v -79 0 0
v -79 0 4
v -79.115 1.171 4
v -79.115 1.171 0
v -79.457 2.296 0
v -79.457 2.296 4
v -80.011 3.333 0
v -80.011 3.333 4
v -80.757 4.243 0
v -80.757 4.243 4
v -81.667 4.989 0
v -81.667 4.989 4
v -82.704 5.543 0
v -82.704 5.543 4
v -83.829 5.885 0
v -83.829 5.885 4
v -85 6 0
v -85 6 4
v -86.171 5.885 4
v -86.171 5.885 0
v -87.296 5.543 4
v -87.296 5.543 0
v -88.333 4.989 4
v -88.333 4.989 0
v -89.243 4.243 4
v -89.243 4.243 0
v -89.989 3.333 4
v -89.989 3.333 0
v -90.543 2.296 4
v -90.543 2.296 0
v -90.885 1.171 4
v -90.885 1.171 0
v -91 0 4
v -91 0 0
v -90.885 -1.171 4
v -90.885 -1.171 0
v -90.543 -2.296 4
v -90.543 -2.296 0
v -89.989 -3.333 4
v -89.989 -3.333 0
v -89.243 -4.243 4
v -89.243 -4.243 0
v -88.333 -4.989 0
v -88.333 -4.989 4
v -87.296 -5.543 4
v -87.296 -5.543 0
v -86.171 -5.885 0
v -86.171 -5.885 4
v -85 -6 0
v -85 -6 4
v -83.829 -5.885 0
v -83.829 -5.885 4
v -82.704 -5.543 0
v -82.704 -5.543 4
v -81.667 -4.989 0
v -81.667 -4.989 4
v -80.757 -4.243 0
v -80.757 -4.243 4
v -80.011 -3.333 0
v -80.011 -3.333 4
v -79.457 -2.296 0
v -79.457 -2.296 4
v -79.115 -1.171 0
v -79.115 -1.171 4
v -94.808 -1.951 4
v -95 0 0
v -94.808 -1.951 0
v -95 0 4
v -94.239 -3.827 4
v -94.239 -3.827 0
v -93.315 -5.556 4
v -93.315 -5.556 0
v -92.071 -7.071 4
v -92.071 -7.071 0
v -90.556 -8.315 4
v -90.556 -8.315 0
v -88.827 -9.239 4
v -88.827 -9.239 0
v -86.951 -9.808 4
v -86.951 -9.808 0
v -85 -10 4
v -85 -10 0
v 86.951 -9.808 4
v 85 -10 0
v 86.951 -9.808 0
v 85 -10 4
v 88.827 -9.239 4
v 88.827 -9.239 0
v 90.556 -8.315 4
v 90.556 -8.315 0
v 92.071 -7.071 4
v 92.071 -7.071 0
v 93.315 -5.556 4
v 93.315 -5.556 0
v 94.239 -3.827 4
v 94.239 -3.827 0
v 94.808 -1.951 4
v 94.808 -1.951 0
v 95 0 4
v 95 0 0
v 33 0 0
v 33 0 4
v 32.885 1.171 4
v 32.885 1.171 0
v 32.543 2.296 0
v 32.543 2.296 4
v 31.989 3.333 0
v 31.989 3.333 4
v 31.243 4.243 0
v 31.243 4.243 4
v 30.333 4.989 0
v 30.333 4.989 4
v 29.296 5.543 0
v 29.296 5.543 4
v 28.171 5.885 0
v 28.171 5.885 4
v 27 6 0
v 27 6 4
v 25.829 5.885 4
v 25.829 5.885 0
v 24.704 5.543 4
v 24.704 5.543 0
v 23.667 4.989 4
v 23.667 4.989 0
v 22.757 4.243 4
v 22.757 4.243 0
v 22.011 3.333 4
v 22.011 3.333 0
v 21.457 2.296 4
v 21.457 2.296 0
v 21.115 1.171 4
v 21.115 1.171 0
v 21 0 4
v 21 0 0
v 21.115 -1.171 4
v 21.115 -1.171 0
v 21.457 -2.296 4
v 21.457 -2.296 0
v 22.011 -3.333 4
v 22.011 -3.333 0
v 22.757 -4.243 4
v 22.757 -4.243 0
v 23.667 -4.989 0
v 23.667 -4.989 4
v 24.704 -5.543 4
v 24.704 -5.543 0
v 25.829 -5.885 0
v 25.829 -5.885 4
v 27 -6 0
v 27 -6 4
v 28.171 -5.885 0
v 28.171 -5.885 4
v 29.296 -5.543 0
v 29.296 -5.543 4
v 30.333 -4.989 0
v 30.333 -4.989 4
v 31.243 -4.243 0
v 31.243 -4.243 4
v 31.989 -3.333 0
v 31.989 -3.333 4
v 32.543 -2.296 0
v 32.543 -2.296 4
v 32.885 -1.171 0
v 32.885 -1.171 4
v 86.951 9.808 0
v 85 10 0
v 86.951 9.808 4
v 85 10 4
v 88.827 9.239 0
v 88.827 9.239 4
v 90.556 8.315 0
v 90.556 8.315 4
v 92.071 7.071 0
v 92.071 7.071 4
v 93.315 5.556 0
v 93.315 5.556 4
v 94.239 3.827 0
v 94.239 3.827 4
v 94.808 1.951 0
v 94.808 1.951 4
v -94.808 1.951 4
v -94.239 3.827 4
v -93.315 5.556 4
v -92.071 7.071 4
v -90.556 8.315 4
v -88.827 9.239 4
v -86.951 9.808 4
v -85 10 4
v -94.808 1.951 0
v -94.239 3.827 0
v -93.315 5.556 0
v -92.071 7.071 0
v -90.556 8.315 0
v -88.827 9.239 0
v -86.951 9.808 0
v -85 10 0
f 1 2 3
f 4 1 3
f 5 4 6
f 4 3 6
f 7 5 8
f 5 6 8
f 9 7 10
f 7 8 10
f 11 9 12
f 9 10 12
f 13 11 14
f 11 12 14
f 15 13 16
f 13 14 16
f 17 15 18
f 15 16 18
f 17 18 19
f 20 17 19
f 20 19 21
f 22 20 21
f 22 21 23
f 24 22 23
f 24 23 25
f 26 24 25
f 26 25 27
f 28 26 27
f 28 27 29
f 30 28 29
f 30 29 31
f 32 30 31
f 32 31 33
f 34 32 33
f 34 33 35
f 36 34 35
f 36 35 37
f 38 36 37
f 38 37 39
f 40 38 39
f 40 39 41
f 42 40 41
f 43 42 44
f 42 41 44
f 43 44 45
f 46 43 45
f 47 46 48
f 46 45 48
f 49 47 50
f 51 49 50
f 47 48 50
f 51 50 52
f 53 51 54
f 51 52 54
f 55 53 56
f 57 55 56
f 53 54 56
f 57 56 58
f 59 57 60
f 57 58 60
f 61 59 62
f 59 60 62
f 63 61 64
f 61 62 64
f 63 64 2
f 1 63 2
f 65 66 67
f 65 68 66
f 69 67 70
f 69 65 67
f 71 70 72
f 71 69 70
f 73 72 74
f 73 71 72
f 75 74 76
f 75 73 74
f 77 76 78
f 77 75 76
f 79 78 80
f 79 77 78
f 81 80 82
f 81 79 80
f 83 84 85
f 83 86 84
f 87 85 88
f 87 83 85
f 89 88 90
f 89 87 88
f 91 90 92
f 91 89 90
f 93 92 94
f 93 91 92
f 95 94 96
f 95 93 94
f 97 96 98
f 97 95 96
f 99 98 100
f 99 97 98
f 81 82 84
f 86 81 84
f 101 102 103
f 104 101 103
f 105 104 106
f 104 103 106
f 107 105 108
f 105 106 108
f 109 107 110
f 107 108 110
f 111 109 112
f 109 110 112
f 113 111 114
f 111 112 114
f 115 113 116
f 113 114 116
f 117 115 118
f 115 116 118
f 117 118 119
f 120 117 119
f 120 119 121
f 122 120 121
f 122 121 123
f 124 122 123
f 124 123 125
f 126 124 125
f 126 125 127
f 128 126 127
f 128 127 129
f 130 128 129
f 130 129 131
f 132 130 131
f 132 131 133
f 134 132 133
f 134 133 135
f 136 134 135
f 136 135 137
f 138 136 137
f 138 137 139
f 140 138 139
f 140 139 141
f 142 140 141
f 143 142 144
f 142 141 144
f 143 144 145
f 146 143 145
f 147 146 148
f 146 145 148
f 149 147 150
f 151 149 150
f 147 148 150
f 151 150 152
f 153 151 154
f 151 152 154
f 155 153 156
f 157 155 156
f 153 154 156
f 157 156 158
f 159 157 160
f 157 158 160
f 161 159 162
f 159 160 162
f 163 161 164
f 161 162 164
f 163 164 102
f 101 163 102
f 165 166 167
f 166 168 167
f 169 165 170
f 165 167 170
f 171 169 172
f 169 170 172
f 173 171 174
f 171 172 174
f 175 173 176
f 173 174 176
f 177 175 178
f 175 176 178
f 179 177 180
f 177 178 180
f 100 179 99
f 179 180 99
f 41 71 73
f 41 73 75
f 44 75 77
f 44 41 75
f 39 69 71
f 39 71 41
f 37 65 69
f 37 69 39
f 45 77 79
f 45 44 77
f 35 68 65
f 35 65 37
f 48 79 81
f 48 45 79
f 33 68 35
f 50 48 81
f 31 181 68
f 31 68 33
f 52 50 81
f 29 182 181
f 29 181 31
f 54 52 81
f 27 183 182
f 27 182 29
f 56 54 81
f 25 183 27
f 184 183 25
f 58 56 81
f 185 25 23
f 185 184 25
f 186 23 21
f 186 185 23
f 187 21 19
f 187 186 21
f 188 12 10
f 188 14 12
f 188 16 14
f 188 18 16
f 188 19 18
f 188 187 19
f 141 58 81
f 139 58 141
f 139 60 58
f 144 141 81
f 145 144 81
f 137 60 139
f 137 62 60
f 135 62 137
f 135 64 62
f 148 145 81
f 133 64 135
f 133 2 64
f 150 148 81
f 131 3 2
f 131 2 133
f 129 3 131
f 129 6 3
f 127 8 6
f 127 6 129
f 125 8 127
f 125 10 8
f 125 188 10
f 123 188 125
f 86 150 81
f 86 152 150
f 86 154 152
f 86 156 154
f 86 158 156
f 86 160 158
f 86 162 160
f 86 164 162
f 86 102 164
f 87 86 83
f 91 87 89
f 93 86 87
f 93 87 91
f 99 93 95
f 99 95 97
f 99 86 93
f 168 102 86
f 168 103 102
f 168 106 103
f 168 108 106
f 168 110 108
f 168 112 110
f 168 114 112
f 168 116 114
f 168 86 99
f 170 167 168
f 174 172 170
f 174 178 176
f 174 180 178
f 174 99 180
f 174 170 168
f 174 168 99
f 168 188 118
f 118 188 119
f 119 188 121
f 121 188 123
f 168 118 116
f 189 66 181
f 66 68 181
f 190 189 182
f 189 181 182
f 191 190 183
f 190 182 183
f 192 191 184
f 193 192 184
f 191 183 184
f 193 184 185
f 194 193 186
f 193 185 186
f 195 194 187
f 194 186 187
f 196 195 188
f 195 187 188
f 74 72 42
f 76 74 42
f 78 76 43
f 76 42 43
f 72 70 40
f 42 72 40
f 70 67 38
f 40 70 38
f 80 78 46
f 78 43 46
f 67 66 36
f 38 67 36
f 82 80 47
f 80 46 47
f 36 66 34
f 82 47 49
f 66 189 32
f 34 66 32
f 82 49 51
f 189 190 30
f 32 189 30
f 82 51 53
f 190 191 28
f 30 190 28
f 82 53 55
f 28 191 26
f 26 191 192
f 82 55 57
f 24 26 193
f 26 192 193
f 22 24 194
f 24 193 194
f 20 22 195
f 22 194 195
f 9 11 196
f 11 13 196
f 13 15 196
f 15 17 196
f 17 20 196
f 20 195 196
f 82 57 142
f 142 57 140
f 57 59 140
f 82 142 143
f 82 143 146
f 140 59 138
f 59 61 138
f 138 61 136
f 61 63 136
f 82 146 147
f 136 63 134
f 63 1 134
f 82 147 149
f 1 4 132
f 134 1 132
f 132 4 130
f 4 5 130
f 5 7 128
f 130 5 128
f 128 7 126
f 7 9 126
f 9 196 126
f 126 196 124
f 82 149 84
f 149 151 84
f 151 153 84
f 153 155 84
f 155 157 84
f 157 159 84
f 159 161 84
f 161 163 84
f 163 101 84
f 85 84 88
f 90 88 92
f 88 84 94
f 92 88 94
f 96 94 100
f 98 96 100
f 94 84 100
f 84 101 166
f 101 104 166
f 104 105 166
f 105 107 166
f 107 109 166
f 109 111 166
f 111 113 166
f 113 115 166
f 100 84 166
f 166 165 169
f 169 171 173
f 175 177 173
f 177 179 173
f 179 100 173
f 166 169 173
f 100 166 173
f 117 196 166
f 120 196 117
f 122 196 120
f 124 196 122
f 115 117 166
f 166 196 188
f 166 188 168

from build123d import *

# Parameters (mm, degrees)
F0_W     = 190
F0_H     = 20
F1_DEPTH = 4
F2_R     = 6
F3_DEPTH = 4.001
F4_R     = 9.99999


# Not quite as in the source:
# - a fillet or chamfer is up to 0.001 mm smaller than in the source, because OpenCascade refuses the exact size


with BuildPart() as f1:
    # F0 (on Top) → F1 (new body)
    with BuildSketch(Plane.XY):
        Rectangle(F0_W, F0_H)
    extrude(amount=F1_DEPTH)

    # F2 (on face) → F3 (cut, through all)
    with BuildSketch(Plane.XY.offset(4)):
        with Locations((-85, 0)):
            Circle(F2_R)
        with Locations((27, 0)):
            Circle(F2_R)
    extrude(amount=-F3_DEPTH, mode=Mode.SUBTRACT)

    # F4 (radius 10 in the source; OpenCascade refuses exactly that, so slightly less here)
    f4_edges = [f1.edges().sort_by_distance(p)[0] for p in [
        (-95, -10, 2),
        (-95, 10, 2),
        (95, 10, 2),
        (95, -10, 2),
    ]]
    fillet(f4_edges, radius=F4_R)


solid = f1.part
